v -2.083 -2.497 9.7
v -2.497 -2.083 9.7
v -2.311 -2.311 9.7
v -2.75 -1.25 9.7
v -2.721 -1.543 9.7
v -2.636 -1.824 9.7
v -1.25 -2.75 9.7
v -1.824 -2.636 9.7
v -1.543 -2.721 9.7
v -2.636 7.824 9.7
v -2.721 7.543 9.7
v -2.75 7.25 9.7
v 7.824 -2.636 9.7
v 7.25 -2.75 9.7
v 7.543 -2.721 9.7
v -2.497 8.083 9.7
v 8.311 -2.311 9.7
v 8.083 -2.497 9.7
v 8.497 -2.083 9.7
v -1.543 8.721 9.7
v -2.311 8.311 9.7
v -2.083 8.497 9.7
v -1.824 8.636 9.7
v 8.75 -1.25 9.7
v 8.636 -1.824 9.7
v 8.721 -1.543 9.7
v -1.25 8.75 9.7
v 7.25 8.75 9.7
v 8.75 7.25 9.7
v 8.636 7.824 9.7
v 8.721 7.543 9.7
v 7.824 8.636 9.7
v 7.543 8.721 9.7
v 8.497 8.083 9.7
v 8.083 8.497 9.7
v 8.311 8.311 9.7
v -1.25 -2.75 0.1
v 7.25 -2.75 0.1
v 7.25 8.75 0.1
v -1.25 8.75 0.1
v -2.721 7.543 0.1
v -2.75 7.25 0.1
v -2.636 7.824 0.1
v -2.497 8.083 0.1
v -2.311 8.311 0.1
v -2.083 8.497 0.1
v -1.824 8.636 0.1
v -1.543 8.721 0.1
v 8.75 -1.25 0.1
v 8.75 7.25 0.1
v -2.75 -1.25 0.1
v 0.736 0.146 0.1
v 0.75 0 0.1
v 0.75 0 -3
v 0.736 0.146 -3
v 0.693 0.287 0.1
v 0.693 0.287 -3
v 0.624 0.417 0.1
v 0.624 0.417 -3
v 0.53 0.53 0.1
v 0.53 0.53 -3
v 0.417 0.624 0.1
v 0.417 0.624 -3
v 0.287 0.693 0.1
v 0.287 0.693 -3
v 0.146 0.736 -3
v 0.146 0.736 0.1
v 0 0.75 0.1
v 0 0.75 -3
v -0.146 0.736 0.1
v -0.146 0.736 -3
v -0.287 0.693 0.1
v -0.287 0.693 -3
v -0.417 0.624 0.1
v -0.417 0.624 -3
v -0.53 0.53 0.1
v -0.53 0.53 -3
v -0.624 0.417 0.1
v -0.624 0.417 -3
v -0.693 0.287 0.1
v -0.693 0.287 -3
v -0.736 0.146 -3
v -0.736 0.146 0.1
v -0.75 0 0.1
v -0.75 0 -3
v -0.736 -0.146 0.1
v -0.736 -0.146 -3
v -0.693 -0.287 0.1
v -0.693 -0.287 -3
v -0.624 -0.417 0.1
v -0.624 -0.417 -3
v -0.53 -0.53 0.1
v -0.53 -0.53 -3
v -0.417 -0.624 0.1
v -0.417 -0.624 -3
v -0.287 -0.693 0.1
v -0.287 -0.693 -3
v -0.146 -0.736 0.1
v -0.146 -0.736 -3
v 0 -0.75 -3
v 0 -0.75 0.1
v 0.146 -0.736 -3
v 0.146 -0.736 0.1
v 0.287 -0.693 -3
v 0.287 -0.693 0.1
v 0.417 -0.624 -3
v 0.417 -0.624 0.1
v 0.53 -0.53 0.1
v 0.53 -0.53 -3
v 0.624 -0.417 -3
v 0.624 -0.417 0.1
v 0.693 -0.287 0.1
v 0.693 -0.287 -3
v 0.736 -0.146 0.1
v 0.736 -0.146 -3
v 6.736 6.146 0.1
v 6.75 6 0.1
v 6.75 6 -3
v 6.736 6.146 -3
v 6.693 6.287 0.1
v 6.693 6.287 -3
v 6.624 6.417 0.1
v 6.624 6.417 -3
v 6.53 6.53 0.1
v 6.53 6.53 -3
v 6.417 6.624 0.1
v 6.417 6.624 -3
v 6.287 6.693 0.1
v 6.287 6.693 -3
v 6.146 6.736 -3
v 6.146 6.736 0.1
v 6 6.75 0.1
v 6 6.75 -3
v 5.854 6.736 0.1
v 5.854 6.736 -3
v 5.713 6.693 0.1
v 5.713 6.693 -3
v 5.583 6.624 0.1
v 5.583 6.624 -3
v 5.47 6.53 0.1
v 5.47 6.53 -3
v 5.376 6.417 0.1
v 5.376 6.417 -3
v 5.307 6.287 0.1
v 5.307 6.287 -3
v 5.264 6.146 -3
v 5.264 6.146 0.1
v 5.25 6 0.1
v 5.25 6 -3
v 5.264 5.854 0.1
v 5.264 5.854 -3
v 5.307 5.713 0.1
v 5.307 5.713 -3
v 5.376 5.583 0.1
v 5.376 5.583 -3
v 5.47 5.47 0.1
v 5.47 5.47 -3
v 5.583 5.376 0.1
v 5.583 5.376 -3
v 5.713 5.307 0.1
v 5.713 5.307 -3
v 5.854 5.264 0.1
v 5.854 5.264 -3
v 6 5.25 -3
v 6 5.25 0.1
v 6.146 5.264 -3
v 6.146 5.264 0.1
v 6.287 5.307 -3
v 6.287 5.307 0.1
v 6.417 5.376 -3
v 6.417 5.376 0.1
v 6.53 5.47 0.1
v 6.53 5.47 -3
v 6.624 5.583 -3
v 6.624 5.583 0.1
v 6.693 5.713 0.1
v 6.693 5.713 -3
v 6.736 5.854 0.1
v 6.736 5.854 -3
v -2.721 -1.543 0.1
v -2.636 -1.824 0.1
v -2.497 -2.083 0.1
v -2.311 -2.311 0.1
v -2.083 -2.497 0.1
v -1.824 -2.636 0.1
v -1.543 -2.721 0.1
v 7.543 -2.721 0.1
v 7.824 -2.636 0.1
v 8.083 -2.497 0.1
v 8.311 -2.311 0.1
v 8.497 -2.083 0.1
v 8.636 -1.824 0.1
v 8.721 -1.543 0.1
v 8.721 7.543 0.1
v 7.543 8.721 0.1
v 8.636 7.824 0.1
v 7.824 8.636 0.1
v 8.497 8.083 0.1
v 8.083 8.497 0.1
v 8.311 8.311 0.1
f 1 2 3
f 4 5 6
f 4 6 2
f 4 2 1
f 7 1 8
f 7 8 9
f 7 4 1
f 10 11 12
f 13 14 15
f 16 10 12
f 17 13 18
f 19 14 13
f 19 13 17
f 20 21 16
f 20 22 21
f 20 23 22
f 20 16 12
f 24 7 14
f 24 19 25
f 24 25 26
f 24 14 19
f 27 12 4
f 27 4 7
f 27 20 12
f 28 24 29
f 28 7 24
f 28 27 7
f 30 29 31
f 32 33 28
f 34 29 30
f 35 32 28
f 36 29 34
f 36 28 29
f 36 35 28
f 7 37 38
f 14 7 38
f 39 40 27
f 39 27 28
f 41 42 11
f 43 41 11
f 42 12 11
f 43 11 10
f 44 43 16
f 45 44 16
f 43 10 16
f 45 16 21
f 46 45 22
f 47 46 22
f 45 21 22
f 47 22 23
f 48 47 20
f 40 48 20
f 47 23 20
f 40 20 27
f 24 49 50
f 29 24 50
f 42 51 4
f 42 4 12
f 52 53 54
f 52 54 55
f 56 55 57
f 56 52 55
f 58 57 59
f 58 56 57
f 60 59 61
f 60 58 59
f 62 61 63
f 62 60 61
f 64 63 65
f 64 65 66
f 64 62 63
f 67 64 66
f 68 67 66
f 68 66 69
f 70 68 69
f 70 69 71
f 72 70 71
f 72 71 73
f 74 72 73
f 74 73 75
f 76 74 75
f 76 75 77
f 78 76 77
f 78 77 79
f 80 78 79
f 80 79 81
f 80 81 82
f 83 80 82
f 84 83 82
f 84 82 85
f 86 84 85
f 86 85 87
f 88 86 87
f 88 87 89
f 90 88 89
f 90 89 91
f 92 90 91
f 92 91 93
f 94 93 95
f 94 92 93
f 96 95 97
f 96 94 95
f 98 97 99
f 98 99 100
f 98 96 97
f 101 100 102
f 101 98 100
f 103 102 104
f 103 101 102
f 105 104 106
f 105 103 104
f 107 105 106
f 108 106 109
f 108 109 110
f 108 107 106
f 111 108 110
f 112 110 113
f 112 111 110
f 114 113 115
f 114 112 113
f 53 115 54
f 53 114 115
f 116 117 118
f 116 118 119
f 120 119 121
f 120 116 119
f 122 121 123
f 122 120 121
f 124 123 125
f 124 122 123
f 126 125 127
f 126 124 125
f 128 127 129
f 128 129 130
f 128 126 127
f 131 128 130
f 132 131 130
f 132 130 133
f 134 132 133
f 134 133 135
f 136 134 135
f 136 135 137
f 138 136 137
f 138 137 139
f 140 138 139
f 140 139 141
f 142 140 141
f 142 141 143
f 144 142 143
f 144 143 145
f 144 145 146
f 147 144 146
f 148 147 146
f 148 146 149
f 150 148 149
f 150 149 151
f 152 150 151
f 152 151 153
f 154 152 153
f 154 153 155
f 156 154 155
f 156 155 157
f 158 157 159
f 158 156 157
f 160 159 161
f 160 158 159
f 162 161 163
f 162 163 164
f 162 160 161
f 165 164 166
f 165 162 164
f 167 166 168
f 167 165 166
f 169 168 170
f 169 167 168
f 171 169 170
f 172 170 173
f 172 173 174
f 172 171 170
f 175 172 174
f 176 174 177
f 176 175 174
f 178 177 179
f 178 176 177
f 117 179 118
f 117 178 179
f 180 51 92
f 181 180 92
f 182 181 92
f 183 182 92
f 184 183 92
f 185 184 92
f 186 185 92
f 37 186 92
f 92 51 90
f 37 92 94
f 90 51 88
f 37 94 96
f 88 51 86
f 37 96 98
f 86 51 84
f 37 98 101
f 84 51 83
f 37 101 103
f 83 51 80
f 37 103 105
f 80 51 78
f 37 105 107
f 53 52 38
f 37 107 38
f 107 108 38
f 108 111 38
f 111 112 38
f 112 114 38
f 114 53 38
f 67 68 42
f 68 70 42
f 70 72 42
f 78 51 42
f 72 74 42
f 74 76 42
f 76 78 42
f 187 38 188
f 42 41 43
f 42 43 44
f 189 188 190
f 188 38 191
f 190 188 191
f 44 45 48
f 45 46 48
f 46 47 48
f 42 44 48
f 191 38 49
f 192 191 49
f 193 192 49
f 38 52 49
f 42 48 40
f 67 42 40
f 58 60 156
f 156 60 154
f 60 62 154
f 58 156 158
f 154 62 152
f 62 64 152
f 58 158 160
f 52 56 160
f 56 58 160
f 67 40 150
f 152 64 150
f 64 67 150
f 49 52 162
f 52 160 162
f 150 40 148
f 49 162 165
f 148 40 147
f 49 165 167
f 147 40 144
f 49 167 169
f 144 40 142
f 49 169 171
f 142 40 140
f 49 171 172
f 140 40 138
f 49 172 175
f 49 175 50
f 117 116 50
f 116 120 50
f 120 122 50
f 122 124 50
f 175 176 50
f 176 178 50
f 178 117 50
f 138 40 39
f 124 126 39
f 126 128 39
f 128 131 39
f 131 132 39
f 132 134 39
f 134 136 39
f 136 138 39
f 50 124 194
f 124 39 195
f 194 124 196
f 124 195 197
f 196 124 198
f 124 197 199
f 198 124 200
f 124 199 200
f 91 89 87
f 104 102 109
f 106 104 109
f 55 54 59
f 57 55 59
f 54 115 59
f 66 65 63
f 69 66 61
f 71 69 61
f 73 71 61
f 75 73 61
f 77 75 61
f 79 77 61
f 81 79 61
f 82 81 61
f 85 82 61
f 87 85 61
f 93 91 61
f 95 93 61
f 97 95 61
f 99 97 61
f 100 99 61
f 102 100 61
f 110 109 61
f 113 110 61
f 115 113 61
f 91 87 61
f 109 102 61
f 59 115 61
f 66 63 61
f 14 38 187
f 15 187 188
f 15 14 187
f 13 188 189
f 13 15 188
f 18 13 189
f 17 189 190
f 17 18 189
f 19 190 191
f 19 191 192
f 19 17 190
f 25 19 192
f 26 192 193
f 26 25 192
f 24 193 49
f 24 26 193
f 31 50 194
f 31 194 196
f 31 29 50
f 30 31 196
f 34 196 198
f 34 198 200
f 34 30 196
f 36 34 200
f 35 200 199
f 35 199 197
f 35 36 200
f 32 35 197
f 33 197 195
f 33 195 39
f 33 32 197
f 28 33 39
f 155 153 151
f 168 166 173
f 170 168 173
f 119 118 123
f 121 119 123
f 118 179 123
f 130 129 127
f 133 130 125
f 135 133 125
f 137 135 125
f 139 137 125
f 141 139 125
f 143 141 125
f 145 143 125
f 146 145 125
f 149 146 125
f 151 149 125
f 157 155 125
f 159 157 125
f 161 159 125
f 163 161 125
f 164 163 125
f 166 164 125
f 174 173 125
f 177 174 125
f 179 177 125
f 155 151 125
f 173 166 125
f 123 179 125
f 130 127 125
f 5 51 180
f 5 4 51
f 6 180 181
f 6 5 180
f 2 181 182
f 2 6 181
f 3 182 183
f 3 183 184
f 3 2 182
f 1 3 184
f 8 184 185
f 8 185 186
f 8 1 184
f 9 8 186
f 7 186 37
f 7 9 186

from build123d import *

# Parameters (mm, degrees)
SKETCH_W     = 11.5
SKETCH_H     = 11.5
PAD_DEPTH    = 9.6
FILLET_R     = 1.5
SKETCH001_R  = 0.75
PAD001_DEPTH = 3.5


with BuildPart() as fillet_body:
    # Sketch → Pad (new body)
    with BuildSketch(Plane.XY.offset(0.1)):
        with Locations((3, 3)):
            Rectangle(SKETCH_W, SKETCH_H)
    extrude(amount=PAD_DEPTH)

    # Fillet
    fillet_edges = [fillet_body.edges().sort_by_distance(p)[0] for p in [
        (8.75, -2.75, 4.9),
        (8.75, 8.75, 4.9),
        (-2.75, -2.75, 4.9),
        (-2.75, 8.75, 4.9),
    ]]
    fillet(fillet_edges, radius=FILLET_R)


with BuildPart() as pad001_mp_cp:
    # Sketch001 → Pad001 (new body)
    with BuildSketch(Plane.XY.offset(0.5)):
        Circle(SKETCH001_R)
        with Locations((6, 6)):
            Circle(SKETCH001_R)
    extrude(amount=-PAD001_DEPTH)

    # Pad001_mp_cp: union Fillet body
    add(fillet_body.part)


solid = pad001_mp_cp.part
